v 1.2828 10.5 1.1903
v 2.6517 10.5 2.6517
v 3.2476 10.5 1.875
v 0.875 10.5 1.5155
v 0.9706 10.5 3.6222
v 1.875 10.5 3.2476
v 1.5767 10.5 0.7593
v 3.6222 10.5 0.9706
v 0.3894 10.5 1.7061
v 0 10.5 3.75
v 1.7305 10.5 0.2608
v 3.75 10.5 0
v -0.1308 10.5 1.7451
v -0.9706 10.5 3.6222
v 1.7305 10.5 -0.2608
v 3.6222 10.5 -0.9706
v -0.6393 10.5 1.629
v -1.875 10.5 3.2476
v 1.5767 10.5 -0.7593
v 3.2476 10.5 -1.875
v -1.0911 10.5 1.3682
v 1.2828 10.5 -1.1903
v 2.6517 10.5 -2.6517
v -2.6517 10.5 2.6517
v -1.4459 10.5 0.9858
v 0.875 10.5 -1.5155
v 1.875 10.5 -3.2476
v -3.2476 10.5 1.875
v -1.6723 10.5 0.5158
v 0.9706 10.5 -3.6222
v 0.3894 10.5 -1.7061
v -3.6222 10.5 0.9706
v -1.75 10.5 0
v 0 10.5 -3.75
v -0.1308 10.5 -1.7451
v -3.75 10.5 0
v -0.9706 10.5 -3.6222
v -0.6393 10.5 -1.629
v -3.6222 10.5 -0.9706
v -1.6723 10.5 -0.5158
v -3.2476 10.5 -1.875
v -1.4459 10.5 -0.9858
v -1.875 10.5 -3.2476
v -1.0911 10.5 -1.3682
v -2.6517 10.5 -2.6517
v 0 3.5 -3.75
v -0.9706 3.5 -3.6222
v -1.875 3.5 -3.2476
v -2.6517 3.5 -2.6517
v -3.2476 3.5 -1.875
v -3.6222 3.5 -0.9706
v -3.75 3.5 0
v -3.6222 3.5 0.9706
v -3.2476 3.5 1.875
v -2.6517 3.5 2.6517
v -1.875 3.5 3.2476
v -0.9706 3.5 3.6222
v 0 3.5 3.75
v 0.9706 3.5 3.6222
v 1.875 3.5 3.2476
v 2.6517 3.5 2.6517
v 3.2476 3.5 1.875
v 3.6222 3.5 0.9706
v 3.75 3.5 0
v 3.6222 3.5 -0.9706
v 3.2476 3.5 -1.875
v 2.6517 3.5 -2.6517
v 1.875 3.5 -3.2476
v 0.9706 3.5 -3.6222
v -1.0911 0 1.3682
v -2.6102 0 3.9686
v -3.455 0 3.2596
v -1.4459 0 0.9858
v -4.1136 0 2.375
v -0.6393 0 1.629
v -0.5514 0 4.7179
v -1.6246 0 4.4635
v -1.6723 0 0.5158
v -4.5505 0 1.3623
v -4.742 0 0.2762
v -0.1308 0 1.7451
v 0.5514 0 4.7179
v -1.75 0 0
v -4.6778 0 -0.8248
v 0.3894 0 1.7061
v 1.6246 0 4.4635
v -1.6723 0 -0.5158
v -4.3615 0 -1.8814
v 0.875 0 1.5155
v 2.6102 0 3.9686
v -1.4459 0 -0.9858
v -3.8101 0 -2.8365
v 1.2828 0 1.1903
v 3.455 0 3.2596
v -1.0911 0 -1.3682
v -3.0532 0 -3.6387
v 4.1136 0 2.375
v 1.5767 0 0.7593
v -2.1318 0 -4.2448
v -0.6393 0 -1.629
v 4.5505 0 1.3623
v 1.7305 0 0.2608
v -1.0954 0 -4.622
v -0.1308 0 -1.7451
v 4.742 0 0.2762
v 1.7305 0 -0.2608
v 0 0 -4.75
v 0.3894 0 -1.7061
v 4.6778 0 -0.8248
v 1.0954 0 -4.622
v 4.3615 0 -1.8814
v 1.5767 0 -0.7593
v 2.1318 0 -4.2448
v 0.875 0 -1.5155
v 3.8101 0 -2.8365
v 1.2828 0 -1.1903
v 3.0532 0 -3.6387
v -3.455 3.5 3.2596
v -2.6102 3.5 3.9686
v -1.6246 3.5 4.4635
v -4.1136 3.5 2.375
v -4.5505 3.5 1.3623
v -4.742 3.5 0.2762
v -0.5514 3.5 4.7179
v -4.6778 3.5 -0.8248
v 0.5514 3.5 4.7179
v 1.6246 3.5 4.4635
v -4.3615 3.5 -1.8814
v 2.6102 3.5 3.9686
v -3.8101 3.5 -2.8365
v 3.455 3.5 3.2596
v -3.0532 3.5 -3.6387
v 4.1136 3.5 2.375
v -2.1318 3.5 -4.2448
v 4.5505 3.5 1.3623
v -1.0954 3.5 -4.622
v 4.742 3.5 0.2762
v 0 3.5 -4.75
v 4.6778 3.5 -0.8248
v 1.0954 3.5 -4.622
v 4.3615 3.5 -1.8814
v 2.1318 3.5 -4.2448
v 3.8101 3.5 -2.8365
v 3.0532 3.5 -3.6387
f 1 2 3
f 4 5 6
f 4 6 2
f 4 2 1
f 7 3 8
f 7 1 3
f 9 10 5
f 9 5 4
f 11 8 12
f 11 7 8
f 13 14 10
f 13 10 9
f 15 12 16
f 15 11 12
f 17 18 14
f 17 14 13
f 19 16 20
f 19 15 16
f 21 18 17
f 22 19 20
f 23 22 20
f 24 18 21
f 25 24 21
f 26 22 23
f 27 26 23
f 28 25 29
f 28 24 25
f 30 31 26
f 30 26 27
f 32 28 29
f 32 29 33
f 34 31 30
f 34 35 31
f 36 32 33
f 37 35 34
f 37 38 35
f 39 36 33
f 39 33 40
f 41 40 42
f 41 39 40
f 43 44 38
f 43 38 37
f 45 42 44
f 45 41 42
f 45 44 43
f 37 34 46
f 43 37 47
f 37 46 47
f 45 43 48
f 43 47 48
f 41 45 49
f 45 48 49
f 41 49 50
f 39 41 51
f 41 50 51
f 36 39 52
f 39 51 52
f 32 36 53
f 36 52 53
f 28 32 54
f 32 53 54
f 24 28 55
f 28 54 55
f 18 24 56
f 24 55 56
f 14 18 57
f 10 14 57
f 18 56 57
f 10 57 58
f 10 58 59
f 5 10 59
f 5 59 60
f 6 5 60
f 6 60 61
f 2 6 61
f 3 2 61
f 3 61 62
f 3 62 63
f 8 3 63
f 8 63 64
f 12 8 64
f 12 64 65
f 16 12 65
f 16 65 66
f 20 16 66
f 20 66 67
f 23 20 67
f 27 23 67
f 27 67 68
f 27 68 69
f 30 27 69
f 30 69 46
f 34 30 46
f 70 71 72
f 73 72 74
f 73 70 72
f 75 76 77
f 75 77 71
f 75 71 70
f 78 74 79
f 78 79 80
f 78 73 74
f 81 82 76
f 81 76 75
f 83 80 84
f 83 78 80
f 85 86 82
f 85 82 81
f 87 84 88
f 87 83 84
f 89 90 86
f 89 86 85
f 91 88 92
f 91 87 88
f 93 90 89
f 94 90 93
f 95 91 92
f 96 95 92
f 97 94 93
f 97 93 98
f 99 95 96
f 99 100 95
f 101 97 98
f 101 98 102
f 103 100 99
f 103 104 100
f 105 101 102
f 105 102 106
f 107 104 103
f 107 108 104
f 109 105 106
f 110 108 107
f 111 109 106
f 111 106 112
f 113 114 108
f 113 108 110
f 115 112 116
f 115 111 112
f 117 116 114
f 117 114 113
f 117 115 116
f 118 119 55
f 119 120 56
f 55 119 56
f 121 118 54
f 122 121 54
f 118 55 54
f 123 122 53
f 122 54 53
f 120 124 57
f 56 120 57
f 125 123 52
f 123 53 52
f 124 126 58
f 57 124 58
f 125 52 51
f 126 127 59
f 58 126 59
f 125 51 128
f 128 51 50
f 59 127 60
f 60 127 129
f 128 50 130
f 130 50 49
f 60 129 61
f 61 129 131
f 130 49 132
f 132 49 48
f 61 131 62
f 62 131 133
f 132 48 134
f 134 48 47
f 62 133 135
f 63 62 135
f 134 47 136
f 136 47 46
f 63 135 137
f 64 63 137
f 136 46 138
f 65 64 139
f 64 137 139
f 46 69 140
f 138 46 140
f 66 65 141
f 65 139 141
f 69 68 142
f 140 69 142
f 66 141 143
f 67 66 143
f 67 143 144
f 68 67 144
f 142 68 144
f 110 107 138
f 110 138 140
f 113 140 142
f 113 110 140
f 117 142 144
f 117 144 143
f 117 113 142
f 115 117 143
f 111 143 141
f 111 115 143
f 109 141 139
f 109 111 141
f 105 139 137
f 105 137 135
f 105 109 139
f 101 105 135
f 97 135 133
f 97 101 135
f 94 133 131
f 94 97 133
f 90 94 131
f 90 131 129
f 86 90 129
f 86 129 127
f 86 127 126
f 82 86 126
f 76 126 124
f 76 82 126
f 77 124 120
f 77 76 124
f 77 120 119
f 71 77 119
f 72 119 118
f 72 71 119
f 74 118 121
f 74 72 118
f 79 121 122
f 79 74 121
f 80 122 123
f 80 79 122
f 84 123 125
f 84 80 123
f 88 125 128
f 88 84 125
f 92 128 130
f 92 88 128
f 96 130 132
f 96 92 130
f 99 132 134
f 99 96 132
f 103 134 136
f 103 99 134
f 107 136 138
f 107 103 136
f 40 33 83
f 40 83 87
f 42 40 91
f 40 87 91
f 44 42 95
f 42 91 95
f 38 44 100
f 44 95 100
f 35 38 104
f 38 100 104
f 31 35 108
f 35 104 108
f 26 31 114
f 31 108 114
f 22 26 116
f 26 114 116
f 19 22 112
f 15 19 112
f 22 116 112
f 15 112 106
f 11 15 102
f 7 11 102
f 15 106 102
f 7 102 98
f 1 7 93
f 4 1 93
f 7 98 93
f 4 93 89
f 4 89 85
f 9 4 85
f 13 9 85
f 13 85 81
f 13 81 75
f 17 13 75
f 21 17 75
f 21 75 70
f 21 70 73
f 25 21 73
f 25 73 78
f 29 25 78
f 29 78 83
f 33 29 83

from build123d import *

# Parameters (mm, degrees)
SKETCH1_R                  = 3.75
BOSS_EXTRUDE1_DEPTH        = 10.5
F_3_5_3_5_DIAMETER_HOLE1_D = 3.5
SKETCH5_R                  = 4.75
SKETCH5_R_2                = 3.75
BOSS_EXTRUDE2_DEPTH        = 3.5


with BuildPart() as part:
    # Sketch1 → Boss-Extrude1 (new body)
    with BuildSketch(Plane(origin=(0, 0, 0), x_dir=(1, 0, 0), z_dir=(0, 1, 0))):
        with Locations(Location((0, 0, 0), (0, 0, 90))):
            Circle(SKETCH1_R)
    extrude(amount=BOSS_EXTRUDE1_DEPTH)

    # Ø3.5 (3.5) Diameter Hole1 (through all)
    with Locations(Plane(origin=(0, 10.5, 0), x_dir=(1, 0, 0), z_dir=(0, 1, 0))):
        with Locations((0, 0)):
            Hole(F_3_5_3_5_DIAMETER_HOLE1_D / 2)

    # Sketch5 → Boss-Extrude2 (add)
    with BuildSketch(Plane.XZ):
        with Locations(Location((0, 0, 0), (0, 0, 270))):
            Circle(SKETCH5_R)
        with Locations(Location((0, 0, 0), (0, 0, 270))):
            Circle(SKETCH5_R_2, mode=Mode.SUBTRACT)
    extrude(amount=-BOSS_EXTRUDE2_DEPTH)


solid = part.part
